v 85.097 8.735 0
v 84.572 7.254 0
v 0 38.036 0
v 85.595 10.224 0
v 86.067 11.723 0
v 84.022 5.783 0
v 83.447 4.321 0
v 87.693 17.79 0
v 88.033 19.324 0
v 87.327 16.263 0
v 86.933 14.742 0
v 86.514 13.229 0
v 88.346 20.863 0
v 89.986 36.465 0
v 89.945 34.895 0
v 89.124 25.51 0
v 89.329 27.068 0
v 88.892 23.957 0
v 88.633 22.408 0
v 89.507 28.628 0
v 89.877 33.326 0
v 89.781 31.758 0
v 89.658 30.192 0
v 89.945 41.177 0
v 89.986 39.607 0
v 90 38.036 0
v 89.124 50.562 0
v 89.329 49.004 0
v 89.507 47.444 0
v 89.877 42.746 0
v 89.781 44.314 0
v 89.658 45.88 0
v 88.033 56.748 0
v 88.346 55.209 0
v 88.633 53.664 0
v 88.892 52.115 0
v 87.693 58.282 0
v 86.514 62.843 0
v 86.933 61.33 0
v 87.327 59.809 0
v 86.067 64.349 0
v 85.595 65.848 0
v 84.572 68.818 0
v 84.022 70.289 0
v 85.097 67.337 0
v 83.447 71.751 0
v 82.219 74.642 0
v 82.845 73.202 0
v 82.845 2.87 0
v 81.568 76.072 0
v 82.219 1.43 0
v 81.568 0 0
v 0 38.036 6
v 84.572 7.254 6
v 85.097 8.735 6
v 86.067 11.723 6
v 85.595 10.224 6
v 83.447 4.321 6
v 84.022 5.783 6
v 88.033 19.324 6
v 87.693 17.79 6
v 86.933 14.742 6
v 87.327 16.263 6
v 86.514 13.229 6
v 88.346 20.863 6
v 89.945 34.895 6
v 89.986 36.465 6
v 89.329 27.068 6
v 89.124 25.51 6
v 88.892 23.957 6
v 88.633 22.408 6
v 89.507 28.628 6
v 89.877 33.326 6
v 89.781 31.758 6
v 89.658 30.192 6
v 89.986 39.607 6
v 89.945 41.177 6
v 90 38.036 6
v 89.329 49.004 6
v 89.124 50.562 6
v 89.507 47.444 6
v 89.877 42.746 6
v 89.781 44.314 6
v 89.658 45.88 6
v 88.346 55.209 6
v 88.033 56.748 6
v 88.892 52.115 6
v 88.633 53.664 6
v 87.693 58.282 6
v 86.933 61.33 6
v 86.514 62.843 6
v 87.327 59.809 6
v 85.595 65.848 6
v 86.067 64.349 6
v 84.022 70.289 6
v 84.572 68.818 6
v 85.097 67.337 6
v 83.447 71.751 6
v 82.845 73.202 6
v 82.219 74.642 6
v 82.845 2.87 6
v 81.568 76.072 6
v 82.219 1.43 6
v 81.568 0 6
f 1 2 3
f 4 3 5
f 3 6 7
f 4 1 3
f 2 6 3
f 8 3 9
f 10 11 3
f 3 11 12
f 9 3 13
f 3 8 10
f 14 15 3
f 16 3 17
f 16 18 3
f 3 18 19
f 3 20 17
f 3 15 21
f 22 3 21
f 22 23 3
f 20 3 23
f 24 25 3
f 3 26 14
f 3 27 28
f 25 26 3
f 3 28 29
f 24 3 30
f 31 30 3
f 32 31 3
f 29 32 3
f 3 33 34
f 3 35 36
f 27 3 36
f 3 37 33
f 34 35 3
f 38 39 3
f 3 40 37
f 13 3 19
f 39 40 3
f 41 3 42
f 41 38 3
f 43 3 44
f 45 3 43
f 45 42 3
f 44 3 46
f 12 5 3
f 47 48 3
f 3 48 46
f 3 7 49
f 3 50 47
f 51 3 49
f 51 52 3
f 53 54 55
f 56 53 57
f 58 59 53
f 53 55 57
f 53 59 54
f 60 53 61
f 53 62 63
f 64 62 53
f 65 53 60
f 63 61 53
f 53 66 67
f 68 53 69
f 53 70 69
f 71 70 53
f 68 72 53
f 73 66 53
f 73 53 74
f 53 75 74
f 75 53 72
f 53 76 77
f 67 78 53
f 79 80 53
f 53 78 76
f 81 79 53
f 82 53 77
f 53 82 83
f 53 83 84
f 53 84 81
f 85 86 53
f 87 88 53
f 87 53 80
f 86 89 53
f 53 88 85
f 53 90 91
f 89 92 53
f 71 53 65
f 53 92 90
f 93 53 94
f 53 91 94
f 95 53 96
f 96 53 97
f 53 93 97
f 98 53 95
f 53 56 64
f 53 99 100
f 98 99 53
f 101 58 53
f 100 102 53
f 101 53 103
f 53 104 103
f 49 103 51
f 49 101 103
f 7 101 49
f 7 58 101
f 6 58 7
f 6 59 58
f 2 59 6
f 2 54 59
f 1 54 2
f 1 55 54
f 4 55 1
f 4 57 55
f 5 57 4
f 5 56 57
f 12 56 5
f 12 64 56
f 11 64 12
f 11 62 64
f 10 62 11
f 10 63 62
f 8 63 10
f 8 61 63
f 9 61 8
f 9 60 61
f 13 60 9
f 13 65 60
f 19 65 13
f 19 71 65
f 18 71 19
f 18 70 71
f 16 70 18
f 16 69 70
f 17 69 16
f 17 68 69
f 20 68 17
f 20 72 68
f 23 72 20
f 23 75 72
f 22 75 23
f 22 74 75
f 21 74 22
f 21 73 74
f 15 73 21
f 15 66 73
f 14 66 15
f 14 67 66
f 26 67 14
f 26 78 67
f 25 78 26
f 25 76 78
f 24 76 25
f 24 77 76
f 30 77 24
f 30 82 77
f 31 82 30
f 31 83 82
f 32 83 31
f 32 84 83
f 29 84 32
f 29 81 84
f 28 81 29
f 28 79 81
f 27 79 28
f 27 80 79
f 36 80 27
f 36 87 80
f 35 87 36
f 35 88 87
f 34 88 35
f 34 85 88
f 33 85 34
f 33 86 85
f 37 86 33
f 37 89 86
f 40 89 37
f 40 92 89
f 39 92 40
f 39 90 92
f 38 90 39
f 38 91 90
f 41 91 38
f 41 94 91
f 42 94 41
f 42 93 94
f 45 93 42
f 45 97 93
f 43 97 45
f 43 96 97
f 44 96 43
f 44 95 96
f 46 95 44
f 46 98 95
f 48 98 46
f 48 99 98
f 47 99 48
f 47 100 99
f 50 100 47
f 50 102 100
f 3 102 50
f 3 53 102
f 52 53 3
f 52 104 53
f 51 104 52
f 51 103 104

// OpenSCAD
$fn = 32;

// ----------------------------------------------------------------------
// Arc profile plate: sector, 52 points
// ----------------------------------------------------------------------

// --- parameters (mm) ---
sector_angle = 50;        // sector angle, degrees
sector_r = 90;            // outer radius
arc_step = 1;             // sampling step of the arc, degrees
plate_t = 6;              // plate thickness, Z

bbox_x = 2 * sector_r * sin(sector_angle / 2);  // chord of the sector
bbox_y = sector_r;  // depth of the sector (apex to arc)

profile = [[81.568, 0], [82.219, 1.43], [82.845, 2.87], [83.447, 4.321], [84.022, 5.783], [84.572, 7.254], [85.097, 8.735], [85.595, 10.224], [86.067, 11.723], [86.514, 13.229], [86.933, 14.742], [87.327, 16.263], [87.693, 17.79], [88.033, 19.324], [88.346, 20.863], [88.633, 22.408], [88.892, 23.957], [89.124, 25.51], [89.329, 27.068], [89.507, 28.628], [89.658, 30.192], [89.781, 31.758], [89.877, 33.326], [89.945, 34.895], [89.986, 36.465], [90, 38.036], [89.986, 39.607], [89.945, 41.177], [89.877, 42.746], [89.781, 44.314], [89.658, 45.88], [89.507, 47.444], [89.329, 49.004], [89.124, 50.562], [88.892, 52.115], [88.633, 53.664], [88.346, 55.209], [88.033, 56.748], [87.693, 58.282], [87.327, 59.809], [86.933, 61.33], [86.514, 62.843], [86.067, 64.349], [85.595, 65.848], [85.097, 67.337], [84.572, 68.818], [84.022, 70.289], [83.447, 71.751], [82.845, 73.202], [82.219, 74.642], [81.568, 76.072], [0, 38.036]];  // primary outline, 52 points, counter clockwise

// --- the one profile operation ---
linear_extrude(height = plate_t) polygon(points = profile);
